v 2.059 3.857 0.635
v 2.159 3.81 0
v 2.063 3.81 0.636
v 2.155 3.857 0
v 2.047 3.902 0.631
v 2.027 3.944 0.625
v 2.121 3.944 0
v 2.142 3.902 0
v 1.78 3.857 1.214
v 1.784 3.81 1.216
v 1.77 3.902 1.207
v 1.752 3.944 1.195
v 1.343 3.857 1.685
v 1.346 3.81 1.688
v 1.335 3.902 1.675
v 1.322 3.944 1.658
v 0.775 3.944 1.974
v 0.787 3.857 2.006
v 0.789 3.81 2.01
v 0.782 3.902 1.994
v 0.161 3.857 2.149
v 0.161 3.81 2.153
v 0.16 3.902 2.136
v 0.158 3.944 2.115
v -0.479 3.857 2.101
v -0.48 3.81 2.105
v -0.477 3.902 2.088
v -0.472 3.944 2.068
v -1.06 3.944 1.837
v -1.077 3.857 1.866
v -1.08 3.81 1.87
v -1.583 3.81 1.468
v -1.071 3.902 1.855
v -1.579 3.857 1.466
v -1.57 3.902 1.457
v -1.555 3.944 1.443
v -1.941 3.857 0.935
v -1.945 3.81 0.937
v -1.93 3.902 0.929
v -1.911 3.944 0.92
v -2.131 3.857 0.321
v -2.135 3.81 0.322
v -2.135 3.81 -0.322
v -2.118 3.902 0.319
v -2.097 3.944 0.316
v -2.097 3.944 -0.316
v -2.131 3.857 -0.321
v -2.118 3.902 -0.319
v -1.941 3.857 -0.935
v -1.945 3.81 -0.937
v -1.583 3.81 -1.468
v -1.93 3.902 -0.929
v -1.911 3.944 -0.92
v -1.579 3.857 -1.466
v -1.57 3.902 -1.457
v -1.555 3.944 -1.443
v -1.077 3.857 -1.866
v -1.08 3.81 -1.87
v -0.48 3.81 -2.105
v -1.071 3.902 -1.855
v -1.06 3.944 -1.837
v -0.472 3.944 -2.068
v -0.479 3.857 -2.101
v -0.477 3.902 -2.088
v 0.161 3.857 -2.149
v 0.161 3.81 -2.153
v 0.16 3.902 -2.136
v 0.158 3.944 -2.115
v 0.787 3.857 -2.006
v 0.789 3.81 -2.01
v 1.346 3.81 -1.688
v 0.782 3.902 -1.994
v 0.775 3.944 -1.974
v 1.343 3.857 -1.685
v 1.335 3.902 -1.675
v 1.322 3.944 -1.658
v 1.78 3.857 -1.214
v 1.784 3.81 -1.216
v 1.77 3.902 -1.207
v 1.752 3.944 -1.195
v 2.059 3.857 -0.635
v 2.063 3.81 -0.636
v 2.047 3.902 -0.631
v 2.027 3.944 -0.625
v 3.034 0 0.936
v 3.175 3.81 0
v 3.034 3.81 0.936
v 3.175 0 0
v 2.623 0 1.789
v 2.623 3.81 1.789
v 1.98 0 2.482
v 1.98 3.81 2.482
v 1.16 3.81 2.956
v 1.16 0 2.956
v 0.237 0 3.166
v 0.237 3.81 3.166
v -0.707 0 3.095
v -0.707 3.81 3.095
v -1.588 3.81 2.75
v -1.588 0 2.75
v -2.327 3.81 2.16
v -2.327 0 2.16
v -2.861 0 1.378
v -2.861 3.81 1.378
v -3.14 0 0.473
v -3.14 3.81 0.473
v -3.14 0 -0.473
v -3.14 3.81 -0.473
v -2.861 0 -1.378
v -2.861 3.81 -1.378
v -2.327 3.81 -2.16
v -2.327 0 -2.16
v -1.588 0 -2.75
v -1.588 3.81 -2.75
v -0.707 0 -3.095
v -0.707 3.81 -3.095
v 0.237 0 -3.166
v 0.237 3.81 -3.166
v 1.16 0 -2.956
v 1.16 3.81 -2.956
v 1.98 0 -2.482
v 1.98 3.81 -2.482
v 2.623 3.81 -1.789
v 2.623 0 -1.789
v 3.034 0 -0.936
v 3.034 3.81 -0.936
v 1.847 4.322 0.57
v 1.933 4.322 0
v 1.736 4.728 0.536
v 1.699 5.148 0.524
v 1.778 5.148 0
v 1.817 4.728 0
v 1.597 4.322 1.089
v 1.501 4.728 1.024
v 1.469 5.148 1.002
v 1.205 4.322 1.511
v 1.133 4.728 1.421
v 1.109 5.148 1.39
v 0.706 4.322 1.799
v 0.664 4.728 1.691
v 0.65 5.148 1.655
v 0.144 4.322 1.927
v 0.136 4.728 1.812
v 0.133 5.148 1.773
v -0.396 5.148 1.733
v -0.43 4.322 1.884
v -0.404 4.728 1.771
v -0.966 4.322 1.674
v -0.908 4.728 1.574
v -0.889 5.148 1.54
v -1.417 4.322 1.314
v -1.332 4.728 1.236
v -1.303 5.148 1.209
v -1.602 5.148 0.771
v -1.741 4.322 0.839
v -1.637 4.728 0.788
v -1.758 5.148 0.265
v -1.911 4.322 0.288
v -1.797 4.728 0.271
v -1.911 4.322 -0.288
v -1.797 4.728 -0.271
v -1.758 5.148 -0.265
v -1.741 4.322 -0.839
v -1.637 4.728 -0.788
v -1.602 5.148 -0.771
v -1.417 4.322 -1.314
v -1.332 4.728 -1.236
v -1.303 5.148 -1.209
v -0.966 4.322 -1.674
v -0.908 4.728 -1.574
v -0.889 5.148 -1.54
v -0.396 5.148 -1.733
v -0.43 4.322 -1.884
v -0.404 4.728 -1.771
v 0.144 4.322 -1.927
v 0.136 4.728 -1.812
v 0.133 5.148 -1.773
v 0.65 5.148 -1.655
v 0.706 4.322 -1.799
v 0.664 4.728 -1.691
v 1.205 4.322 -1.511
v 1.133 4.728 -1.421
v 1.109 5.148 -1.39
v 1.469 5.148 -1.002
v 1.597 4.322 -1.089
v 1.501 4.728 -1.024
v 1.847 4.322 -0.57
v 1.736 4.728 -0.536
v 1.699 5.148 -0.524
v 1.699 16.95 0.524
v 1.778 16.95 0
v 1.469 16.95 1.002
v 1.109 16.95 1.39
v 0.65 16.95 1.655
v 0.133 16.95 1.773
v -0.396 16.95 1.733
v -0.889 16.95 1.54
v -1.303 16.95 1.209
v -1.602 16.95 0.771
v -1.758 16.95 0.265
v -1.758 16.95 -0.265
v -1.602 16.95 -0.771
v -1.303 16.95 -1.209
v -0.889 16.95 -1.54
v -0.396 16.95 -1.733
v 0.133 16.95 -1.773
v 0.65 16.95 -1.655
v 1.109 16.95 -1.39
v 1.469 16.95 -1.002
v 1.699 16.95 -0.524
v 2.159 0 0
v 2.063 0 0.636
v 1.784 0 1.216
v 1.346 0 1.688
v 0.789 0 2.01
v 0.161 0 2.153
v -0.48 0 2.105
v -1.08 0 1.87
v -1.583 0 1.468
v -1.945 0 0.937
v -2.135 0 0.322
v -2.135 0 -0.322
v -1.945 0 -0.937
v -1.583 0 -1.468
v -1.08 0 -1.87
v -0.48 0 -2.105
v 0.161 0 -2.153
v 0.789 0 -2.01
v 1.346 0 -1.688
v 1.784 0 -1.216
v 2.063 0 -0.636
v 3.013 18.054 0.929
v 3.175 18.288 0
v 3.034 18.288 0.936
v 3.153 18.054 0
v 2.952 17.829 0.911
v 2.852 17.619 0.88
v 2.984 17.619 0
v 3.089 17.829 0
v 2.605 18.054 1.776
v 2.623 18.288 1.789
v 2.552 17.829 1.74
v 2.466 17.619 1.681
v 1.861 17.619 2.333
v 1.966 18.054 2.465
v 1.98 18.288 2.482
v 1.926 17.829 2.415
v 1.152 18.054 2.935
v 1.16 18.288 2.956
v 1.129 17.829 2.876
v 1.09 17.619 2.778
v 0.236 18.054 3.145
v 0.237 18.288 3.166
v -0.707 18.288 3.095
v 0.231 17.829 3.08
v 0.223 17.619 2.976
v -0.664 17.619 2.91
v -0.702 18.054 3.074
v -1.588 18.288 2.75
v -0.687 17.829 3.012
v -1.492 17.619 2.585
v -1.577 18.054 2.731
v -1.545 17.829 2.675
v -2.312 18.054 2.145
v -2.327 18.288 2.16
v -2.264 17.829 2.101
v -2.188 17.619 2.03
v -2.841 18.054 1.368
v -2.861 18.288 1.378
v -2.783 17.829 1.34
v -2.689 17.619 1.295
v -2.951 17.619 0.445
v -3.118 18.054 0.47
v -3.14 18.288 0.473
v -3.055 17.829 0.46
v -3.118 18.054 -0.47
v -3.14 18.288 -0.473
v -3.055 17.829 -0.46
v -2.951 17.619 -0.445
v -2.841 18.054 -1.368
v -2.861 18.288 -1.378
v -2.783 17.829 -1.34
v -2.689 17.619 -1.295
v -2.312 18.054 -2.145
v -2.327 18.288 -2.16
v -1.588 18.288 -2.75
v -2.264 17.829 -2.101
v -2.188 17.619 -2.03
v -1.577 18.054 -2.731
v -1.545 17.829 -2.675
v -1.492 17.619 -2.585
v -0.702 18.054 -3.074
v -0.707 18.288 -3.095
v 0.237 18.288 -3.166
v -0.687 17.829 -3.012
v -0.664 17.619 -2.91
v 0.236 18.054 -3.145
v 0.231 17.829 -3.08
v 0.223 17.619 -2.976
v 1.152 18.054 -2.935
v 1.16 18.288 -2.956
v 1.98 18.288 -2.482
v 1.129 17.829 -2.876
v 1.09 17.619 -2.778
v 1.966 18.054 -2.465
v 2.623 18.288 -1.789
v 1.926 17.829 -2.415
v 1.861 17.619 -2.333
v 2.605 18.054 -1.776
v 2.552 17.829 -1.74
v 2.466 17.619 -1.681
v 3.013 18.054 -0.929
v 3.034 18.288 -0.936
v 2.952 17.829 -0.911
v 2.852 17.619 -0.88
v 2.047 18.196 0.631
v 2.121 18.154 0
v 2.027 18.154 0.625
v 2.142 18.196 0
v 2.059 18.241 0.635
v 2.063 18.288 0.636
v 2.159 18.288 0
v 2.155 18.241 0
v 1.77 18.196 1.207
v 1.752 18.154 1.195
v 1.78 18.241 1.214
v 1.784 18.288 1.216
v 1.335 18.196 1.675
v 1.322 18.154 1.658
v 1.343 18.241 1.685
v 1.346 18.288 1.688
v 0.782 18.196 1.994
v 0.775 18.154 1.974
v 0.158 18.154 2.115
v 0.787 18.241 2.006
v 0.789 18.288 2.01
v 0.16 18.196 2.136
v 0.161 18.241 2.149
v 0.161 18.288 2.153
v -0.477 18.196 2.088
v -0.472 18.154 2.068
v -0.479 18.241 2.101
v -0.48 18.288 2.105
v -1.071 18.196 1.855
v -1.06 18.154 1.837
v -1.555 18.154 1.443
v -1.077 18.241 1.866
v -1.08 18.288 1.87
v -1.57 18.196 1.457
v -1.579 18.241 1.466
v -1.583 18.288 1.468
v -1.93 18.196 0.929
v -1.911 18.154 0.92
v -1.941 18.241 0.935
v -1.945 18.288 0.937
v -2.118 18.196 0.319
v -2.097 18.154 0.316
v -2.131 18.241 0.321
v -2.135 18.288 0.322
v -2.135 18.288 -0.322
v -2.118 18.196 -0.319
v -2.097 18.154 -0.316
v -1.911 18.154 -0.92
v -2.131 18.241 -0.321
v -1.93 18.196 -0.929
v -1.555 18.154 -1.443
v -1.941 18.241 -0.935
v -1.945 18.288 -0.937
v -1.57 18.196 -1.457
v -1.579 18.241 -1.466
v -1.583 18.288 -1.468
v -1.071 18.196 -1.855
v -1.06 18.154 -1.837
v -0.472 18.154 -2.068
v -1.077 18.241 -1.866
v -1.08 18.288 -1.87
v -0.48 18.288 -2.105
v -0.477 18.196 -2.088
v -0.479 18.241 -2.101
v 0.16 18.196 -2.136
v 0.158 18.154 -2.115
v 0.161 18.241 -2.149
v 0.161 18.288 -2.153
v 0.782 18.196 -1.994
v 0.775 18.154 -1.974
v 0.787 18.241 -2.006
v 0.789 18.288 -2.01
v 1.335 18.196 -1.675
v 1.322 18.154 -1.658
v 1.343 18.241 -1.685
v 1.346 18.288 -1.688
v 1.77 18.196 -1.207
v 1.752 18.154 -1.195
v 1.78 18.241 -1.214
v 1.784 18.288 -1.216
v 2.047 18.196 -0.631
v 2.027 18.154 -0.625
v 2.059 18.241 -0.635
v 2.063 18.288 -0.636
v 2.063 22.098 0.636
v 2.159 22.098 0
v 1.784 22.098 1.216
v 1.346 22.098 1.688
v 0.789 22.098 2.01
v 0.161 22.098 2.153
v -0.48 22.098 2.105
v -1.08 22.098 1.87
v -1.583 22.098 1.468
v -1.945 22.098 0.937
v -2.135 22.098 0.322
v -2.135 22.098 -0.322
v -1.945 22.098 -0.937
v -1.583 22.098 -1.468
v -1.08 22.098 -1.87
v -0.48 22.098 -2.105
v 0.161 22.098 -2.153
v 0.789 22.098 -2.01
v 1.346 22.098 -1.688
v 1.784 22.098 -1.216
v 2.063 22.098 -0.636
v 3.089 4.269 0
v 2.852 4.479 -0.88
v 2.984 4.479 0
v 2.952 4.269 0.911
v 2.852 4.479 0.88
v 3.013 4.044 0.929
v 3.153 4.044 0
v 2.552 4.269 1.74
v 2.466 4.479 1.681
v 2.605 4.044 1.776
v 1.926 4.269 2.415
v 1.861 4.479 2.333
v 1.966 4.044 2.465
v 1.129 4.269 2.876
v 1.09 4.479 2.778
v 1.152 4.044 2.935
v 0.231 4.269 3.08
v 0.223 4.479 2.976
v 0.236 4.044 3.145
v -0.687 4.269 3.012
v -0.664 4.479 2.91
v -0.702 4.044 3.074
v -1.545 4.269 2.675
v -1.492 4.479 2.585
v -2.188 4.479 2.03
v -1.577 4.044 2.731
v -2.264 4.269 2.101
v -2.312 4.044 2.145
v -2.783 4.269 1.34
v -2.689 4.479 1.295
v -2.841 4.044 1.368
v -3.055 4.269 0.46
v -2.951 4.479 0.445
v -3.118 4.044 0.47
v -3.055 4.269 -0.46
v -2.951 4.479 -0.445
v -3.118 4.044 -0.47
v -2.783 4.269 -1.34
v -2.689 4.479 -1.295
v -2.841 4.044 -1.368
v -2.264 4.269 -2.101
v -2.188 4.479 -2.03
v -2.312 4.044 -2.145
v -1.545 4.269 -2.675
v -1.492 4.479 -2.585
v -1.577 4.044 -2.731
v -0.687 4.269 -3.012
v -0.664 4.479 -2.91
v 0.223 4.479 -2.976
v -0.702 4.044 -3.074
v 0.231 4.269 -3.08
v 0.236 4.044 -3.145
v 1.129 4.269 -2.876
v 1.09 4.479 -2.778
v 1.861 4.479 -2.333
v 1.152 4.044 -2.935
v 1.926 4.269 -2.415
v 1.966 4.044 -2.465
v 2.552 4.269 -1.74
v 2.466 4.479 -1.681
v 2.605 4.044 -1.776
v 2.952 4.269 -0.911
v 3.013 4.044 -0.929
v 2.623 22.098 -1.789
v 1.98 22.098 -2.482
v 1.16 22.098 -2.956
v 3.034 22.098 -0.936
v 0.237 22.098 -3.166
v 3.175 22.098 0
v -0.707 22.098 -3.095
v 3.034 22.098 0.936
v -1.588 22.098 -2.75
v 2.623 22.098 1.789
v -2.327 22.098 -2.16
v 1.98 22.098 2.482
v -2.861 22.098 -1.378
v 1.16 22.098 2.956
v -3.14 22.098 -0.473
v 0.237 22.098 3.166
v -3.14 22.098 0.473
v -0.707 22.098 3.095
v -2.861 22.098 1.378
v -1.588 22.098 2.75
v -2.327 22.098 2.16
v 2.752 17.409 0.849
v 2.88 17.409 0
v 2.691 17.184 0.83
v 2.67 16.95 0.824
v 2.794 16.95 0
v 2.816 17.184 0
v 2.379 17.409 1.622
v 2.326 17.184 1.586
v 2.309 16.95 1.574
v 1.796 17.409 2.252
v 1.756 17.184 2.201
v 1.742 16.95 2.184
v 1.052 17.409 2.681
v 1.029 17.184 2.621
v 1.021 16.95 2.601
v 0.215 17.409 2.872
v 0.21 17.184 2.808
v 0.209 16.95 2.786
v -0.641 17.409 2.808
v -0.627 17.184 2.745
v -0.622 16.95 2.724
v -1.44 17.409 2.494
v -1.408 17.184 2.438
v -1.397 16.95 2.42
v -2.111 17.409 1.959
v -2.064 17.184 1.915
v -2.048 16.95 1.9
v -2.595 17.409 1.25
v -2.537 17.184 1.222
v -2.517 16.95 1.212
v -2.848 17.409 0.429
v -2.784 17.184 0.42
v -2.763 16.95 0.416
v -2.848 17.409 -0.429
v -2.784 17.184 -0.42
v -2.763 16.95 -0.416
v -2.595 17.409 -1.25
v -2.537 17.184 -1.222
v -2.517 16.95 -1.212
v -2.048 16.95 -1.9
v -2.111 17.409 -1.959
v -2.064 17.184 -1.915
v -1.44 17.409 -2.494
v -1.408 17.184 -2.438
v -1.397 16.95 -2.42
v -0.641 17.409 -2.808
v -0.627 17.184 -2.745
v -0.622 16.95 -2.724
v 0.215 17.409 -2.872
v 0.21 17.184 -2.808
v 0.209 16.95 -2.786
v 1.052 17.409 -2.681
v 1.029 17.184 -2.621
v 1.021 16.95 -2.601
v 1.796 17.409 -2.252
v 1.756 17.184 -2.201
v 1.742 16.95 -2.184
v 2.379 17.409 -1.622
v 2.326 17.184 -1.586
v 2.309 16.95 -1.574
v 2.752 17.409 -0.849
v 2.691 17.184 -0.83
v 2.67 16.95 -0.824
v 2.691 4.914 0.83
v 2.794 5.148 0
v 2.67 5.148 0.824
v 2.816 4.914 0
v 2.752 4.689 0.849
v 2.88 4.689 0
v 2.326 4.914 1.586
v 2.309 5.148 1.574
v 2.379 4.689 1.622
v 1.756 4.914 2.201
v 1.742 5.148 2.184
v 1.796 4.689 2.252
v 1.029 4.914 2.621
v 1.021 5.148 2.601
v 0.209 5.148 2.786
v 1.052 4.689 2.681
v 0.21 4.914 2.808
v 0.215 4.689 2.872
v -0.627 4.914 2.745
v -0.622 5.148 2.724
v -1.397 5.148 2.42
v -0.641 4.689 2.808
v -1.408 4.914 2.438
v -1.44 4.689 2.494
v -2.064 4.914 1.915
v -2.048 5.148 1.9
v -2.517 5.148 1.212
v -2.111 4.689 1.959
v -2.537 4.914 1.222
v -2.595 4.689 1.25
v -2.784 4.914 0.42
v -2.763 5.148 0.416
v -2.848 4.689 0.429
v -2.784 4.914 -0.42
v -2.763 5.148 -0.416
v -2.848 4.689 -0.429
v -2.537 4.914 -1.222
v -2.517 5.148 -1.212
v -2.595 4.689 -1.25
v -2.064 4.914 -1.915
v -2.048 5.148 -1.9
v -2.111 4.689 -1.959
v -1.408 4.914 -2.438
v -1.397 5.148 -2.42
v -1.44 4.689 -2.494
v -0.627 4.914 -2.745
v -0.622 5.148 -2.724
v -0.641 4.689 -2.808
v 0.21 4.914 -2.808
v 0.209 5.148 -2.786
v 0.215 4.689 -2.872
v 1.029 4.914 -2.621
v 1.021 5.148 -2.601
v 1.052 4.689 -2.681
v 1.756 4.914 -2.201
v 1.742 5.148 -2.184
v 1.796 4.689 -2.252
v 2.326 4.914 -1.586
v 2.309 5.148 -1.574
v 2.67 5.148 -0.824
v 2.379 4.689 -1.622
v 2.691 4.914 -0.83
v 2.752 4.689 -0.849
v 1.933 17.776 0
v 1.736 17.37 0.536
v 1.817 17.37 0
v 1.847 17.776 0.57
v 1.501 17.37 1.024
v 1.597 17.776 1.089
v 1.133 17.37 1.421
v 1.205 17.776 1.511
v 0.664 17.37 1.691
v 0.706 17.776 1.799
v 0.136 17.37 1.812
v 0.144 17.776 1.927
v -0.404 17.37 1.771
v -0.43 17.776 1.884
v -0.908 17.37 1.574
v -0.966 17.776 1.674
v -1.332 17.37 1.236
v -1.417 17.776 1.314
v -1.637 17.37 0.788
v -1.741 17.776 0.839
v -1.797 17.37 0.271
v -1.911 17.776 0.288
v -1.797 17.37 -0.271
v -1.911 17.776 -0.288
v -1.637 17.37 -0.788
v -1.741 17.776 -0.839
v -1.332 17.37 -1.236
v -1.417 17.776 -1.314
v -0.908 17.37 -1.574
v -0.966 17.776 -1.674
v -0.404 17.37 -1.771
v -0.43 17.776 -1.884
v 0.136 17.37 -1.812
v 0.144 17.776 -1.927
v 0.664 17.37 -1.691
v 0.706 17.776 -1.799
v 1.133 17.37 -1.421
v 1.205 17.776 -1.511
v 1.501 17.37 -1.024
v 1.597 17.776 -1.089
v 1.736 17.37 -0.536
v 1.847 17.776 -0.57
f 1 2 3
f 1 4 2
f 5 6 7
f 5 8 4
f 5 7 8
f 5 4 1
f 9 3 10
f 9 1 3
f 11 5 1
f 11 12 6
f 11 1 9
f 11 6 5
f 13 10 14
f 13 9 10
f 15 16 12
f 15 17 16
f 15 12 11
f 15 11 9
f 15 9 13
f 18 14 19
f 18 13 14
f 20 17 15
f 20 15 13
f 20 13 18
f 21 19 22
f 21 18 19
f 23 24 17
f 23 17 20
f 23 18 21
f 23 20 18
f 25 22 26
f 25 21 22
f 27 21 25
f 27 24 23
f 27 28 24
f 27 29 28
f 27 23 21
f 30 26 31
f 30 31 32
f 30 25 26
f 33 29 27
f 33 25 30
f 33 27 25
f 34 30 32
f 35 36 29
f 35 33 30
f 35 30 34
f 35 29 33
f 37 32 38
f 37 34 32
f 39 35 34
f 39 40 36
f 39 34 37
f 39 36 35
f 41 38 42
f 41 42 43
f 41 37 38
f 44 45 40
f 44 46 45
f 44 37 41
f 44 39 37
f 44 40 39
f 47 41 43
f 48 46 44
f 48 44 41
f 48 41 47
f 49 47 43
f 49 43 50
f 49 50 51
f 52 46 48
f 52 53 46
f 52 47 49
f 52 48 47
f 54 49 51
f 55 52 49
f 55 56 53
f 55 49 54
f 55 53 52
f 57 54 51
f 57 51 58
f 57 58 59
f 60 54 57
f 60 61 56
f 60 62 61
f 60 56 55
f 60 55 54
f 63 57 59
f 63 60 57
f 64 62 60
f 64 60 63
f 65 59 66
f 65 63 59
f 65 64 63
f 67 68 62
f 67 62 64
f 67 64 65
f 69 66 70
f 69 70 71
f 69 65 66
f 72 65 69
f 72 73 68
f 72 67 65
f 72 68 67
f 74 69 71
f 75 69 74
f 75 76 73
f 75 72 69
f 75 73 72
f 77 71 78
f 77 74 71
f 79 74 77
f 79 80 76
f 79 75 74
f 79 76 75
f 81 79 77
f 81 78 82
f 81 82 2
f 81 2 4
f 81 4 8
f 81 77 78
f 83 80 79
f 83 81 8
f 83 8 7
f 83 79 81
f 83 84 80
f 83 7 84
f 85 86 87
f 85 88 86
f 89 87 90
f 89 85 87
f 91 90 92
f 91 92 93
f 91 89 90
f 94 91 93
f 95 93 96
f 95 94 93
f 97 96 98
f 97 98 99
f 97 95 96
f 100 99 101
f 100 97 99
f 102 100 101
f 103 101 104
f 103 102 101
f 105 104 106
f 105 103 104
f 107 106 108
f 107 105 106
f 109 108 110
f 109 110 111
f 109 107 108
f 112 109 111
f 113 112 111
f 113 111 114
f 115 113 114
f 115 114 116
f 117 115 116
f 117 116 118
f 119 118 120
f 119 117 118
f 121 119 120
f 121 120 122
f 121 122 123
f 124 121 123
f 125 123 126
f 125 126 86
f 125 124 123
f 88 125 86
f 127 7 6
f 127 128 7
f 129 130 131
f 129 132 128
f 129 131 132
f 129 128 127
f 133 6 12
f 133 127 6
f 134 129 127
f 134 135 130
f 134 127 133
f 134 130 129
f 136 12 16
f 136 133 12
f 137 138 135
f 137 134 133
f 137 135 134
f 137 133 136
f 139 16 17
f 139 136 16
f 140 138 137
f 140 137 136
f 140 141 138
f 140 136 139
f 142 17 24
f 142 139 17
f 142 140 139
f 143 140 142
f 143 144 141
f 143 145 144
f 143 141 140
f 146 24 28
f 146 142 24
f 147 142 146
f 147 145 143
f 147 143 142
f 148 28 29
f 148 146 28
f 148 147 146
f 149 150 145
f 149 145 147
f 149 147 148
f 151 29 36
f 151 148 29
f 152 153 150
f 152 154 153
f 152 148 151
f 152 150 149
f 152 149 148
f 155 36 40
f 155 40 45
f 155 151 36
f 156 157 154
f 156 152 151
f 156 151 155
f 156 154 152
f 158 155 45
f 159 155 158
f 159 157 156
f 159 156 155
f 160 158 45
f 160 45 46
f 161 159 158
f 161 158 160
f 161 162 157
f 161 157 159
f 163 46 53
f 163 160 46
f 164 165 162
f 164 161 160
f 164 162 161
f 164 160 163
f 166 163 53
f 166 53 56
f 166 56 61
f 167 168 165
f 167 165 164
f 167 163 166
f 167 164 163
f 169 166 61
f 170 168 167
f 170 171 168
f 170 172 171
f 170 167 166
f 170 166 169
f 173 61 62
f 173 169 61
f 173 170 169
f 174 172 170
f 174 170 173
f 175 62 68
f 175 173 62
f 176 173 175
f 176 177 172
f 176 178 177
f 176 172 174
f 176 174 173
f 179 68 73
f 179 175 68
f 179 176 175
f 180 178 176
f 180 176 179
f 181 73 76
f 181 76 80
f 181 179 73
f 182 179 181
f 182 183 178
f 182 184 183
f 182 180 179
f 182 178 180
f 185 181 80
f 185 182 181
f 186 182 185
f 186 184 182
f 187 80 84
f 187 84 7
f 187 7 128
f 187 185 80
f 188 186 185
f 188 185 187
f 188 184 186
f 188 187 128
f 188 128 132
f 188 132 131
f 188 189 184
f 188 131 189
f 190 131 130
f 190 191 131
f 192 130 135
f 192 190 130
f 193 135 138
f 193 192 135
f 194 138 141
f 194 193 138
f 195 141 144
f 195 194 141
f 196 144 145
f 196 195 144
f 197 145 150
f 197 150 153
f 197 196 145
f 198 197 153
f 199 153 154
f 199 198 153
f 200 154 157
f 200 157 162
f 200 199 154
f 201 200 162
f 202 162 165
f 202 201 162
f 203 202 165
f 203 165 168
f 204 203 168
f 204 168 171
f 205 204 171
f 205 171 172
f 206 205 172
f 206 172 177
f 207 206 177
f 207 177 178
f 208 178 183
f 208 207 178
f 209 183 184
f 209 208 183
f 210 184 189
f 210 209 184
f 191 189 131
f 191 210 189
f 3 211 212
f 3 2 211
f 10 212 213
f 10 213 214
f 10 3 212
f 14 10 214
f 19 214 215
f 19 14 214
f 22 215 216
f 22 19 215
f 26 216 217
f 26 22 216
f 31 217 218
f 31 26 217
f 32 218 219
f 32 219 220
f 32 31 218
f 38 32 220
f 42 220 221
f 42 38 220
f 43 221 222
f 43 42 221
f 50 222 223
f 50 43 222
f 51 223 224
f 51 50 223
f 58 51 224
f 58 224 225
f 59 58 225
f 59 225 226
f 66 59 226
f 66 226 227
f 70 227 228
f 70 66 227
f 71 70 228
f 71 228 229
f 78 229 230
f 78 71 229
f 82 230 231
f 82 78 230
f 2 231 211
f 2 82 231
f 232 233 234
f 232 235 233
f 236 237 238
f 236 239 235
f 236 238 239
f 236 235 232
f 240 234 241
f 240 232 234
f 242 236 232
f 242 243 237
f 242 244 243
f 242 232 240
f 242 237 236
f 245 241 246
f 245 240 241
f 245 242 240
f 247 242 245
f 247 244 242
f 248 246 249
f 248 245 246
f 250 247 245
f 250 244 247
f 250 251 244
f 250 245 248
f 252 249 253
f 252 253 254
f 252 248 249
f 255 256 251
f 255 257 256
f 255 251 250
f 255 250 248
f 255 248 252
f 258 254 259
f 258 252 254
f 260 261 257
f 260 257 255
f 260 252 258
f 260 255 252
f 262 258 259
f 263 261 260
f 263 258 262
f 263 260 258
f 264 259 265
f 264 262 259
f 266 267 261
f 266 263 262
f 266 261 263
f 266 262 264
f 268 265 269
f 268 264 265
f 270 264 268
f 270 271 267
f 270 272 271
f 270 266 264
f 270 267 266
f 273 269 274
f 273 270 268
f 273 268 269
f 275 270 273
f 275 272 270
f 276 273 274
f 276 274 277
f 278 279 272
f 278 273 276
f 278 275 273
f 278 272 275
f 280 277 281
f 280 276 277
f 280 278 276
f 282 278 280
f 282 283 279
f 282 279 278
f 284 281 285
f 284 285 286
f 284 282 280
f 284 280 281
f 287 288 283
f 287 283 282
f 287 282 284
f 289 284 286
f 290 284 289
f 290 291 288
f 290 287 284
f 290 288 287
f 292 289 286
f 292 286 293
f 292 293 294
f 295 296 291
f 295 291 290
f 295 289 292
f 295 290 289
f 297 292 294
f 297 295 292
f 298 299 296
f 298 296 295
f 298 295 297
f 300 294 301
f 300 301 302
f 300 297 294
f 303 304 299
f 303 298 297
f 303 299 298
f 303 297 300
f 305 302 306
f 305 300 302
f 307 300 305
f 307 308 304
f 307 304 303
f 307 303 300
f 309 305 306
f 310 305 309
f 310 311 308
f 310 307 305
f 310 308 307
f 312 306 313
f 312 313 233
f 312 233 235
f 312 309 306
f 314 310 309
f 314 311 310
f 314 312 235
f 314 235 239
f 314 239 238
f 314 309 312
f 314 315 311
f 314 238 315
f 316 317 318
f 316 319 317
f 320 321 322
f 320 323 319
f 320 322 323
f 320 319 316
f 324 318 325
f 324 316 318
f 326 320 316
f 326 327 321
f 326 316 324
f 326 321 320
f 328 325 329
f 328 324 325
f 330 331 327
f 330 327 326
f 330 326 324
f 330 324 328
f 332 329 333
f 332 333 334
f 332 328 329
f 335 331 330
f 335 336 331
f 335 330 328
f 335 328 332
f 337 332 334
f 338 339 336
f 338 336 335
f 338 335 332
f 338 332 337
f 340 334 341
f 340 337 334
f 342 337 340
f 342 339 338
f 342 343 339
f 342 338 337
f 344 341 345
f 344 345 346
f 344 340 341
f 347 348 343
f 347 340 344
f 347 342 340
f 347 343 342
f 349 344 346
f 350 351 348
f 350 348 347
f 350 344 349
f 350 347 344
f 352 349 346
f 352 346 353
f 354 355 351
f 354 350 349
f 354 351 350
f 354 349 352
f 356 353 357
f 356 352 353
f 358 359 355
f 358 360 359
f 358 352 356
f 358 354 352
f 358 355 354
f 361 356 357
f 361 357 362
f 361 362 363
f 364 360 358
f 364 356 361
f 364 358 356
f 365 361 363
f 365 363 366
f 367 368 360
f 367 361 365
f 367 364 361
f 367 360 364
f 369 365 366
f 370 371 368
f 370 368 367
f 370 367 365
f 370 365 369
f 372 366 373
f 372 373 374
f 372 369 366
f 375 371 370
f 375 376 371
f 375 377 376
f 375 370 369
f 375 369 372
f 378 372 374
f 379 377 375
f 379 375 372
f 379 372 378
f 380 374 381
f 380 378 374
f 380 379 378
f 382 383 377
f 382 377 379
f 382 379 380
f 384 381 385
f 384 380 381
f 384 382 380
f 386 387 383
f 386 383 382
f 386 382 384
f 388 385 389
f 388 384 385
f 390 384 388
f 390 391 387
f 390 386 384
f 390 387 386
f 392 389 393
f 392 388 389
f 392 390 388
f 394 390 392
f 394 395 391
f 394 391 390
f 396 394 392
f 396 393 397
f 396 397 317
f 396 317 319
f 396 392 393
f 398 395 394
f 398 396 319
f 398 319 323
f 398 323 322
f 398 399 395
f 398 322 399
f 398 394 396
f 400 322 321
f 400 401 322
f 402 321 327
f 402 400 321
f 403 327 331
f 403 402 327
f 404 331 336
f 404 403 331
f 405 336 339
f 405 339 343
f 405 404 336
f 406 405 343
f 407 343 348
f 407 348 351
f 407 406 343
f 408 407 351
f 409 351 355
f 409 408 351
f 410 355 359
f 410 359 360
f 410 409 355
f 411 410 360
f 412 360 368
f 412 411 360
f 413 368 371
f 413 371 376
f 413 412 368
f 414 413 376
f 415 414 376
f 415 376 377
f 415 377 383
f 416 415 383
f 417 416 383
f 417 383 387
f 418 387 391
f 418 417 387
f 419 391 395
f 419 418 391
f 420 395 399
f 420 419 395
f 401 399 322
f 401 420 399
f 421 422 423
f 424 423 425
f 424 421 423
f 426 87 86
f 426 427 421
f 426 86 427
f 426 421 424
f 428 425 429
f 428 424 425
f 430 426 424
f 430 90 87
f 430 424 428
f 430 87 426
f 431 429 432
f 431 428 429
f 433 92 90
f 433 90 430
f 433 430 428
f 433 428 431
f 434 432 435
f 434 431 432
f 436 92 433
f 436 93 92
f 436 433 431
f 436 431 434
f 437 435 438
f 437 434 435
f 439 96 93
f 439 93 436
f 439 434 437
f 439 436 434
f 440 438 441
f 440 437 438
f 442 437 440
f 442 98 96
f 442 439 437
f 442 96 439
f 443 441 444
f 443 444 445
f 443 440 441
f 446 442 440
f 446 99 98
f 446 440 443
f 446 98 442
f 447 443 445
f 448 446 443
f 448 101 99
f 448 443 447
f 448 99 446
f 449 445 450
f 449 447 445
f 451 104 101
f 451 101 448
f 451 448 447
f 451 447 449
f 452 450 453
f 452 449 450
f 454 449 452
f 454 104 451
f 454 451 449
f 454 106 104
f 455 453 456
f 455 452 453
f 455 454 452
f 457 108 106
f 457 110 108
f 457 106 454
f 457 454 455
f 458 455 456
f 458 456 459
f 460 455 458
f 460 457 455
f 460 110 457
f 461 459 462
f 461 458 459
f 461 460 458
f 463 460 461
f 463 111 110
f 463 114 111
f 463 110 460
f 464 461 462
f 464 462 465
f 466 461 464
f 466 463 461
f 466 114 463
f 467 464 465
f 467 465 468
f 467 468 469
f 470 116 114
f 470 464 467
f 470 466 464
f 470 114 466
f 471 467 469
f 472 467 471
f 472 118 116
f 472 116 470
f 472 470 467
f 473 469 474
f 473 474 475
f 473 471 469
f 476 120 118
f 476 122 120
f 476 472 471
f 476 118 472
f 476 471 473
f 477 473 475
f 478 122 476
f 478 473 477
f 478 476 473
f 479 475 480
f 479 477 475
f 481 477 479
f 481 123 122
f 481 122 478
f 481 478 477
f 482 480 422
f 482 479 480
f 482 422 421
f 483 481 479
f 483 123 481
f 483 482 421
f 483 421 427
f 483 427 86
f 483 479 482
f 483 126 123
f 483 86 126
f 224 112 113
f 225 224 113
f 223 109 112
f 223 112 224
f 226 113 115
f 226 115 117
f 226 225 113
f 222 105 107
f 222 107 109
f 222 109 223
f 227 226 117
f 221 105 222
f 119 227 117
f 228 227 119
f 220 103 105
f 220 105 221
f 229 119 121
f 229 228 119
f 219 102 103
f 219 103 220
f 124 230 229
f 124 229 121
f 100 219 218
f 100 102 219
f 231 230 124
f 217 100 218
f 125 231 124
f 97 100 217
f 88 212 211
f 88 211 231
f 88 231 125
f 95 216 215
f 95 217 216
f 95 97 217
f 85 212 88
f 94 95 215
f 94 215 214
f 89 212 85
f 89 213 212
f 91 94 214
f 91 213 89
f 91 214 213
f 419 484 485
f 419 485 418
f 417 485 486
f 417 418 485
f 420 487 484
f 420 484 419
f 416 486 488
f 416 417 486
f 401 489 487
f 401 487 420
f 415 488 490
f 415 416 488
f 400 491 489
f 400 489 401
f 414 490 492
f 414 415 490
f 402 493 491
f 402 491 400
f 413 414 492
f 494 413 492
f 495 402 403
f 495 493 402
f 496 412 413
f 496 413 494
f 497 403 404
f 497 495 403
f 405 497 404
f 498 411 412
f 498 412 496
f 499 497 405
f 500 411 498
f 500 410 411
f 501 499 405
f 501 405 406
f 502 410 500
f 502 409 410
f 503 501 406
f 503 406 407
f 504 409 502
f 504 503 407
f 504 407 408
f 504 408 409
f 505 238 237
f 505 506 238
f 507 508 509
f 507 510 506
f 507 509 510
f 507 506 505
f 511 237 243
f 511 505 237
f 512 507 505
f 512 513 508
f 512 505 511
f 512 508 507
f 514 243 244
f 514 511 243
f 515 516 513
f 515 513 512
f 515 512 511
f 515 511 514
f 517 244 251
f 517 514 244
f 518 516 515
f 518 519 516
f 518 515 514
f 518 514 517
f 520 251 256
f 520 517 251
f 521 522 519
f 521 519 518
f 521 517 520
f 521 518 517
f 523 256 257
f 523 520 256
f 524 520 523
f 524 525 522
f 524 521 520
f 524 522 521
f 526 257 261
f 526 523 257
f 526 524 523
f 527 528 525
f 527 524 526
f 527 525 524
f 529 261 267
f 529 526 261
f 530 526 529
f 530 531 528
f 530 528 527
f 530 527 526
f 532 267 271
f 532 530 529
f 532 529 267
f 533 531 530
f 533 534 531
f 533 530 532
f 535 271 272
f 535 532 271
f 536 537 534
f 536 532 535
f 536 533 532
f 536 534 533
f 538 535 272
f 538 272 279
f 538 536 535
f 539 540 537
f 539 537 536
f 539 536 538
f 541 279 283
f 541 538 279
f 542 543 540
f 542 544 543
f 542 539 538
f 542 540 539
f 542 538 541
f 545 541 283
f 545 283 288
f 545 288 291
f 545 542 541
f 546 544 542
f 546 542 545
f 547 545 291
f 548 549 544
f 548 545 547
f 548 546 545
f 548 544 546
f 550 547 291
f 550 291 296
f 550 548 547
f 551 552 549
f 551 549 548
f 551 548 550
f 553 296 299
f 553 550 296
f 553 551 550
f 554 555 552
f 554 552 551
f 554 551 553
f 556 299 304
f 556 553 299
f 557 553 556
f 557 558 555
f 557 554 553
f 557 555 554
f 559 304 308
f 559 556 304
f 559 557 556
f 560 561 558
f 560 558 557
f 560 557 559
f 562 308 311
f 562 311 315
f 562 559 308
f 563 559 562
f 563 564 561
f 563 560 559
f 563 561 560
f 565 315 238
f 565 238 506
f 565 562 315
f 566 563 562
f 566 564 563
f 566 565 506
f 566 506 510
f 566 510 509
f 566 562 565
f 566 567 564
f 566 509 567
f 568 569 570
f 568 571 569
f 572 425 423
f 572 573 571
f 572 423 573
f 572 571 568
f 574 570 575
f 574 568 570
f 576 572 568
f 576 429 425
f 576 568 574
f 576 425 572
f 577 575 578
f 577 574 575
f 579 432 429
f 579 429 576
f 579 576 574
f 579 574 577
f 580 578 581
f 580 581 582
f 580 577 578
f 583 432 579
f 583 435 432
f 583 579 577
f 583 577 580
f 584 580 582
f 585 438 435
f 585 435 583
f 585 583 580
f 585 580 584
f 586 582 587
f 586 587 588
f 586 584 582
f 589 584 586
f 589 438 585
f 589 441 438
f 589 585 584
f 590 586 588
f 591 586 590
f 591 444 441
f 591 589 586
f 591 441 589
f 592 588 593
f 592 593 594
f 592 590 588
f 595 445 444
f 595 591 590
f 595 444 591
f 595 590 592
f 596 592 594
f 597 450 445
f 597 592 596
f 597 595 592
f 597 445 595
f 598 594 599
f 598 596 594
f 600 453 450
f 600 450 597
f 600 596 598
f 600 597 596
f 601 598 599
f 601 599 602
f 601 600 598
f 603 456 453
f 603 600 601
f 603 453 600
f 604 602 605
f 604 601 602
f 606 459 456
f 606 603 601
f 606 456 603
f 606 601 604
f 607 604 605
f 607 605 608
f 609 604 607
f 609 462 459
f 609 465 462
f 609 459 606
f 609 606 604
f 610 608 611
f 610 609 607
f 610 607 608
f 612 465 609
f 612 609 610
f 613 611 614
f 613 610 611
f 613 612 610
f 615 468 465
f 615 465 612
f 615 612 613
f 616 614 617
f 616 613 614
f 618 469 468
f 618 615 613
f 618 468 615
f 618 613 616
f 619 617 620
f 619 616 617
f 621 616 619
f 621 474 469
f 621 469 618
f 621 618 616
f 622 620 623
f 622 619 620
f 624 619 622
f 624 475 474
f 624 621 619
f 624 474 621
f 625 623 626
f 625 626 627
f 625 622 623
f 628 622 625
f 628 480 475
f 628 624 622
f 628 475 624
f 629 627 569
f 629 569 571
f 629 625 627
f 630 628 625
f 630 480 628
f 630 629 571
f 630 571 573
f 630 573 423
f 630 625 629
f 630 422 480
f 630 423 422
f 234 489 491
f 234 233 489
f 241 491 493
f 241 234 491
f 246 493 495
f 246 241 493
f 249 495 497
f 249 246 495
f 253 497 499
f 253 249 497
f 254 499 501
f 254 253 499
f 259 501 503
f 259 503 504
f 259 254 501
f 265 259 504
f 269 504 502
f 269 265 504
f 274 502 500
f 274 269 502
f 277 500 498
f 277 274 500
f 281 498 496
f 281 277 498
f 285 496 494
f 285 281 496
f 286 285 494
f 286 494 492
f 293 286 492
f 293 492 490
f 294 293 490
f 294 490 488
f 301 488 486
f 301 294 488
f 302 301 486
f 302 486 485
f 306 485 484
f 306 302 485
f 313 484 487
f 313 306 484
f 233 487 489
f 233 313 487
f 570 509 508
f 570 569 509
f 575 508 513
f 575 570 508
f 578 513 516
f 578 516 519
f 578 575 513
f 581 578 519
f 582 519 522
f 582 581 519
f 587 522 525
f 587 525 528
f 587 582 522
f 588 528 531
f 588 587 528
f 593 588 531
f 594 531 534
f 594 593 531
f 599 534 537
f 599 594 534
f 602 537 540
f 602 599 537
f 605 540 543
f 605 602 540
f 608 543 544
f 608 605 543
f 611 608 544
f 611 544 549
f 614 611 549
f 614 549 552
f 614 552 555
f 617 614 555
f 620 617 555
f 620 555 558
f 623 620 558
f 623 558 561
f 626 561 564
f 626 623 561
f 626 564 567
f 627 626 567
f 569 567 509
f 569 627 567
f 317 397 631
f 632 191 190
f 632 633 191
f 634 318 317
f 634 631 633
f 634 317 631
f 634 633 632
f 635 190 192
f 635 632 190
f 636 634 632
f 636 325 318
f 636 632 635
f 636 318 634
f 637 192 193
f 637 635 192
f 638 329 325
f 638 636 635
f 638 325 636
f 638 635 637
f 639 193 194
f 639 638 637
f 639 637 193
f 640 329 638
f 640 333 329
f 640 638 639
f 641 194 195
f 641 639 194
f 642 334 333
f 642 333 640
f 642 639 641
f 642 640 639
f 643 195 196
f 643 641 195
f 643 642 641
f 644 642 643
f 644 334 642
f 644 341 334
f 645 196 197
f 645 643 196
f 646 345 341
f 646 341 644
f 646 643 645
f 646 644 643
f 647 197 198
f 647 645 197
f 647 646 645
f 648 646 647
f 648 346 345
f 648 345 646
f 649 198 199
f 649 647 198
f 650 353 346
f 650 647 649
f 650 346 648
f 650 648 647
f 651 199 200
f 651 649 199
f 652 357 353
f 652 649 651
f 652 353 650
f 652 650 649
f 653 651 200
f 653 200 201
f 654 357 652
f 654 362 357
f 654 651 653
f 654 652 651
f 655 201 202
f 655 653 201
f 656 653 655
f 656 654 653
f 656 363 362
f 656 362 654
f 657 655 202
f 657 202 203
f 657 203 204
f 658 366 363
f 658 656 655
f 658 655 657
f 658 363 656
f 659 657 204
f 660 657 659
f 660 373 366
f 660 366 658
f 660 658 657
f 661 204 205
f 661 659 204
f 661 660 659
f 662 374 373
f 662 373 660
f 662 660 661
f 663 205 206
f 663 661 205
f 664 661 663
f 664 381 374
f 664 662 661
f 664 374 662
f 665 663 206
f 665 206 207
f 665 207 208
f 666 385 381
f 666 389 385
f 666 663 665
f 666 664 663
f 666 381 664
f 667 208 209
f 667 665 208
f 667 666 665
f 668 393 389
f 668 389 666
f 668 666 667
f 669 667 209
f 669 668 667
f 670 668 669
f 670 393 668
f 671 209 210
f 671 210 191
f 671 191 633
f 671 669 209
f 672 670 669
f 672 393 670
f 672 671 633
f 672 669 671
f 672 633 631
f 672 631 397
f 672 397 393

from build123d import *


with BuildPart() as part:
    # Sketch1 → Revolve-Thin1 (revolve)
    with BuildSketch(Plane.XY):
        with BuildLine():
            Line((3.175, 22.098), (3.175, 18.288))
            ThreePointArc((3.175, 18.288), (3.126446888, 17.940196176), (2.9845, 17.618985987))
            ThreePointArc((2.9845, 17.618985987), (2.842553112, 17.297775797), (2.794, 16.949971973))
            Line((2.794, 16.949971973), (2.794, 5.148028027))
            ThreePointArc((2.794, 5.148028027), (2.842553112, 4.800224203), (2.9845, 4.479014013))
            ThreePointArc((2.9845, 4.479014013), (3.126446888, 4.157803824), (3.175, 3.81))
            Line((3.175, 3.81), (3.175, 0))
            Line((3.175, 0), (2.159, 0))
            Line((2.159, 0), (2.159, 3.81))
            ThreePointArc((2.159, 3.81), (2.149289378, 3.879560765), (2.1209, 3.943802803))
            ThreePointArc((2.1209, 3.943802803), (1.865395602, 4.521981143), (1.778, 5.148028027))
            Line((1.778, 5.148028027), (1.778, 16.949971973))
            ThreePointArc((1.778, 16.949971973), (1.865395602, 17.576018857), (2.1209, 18.154197197))
            ThreePointArc((2.1209, 18.154197197), (2.149289378, 18.218439235), (2.159, 18.288))
            Line((2.159, 18.288), (2.159, 22.098))
            Line((2.159, 22.098), (3.175, 22.098))
        make_face()
    revolve(axis=Axis((0, 22.098, 0), (0, -1, 0)))


solid = part.part
